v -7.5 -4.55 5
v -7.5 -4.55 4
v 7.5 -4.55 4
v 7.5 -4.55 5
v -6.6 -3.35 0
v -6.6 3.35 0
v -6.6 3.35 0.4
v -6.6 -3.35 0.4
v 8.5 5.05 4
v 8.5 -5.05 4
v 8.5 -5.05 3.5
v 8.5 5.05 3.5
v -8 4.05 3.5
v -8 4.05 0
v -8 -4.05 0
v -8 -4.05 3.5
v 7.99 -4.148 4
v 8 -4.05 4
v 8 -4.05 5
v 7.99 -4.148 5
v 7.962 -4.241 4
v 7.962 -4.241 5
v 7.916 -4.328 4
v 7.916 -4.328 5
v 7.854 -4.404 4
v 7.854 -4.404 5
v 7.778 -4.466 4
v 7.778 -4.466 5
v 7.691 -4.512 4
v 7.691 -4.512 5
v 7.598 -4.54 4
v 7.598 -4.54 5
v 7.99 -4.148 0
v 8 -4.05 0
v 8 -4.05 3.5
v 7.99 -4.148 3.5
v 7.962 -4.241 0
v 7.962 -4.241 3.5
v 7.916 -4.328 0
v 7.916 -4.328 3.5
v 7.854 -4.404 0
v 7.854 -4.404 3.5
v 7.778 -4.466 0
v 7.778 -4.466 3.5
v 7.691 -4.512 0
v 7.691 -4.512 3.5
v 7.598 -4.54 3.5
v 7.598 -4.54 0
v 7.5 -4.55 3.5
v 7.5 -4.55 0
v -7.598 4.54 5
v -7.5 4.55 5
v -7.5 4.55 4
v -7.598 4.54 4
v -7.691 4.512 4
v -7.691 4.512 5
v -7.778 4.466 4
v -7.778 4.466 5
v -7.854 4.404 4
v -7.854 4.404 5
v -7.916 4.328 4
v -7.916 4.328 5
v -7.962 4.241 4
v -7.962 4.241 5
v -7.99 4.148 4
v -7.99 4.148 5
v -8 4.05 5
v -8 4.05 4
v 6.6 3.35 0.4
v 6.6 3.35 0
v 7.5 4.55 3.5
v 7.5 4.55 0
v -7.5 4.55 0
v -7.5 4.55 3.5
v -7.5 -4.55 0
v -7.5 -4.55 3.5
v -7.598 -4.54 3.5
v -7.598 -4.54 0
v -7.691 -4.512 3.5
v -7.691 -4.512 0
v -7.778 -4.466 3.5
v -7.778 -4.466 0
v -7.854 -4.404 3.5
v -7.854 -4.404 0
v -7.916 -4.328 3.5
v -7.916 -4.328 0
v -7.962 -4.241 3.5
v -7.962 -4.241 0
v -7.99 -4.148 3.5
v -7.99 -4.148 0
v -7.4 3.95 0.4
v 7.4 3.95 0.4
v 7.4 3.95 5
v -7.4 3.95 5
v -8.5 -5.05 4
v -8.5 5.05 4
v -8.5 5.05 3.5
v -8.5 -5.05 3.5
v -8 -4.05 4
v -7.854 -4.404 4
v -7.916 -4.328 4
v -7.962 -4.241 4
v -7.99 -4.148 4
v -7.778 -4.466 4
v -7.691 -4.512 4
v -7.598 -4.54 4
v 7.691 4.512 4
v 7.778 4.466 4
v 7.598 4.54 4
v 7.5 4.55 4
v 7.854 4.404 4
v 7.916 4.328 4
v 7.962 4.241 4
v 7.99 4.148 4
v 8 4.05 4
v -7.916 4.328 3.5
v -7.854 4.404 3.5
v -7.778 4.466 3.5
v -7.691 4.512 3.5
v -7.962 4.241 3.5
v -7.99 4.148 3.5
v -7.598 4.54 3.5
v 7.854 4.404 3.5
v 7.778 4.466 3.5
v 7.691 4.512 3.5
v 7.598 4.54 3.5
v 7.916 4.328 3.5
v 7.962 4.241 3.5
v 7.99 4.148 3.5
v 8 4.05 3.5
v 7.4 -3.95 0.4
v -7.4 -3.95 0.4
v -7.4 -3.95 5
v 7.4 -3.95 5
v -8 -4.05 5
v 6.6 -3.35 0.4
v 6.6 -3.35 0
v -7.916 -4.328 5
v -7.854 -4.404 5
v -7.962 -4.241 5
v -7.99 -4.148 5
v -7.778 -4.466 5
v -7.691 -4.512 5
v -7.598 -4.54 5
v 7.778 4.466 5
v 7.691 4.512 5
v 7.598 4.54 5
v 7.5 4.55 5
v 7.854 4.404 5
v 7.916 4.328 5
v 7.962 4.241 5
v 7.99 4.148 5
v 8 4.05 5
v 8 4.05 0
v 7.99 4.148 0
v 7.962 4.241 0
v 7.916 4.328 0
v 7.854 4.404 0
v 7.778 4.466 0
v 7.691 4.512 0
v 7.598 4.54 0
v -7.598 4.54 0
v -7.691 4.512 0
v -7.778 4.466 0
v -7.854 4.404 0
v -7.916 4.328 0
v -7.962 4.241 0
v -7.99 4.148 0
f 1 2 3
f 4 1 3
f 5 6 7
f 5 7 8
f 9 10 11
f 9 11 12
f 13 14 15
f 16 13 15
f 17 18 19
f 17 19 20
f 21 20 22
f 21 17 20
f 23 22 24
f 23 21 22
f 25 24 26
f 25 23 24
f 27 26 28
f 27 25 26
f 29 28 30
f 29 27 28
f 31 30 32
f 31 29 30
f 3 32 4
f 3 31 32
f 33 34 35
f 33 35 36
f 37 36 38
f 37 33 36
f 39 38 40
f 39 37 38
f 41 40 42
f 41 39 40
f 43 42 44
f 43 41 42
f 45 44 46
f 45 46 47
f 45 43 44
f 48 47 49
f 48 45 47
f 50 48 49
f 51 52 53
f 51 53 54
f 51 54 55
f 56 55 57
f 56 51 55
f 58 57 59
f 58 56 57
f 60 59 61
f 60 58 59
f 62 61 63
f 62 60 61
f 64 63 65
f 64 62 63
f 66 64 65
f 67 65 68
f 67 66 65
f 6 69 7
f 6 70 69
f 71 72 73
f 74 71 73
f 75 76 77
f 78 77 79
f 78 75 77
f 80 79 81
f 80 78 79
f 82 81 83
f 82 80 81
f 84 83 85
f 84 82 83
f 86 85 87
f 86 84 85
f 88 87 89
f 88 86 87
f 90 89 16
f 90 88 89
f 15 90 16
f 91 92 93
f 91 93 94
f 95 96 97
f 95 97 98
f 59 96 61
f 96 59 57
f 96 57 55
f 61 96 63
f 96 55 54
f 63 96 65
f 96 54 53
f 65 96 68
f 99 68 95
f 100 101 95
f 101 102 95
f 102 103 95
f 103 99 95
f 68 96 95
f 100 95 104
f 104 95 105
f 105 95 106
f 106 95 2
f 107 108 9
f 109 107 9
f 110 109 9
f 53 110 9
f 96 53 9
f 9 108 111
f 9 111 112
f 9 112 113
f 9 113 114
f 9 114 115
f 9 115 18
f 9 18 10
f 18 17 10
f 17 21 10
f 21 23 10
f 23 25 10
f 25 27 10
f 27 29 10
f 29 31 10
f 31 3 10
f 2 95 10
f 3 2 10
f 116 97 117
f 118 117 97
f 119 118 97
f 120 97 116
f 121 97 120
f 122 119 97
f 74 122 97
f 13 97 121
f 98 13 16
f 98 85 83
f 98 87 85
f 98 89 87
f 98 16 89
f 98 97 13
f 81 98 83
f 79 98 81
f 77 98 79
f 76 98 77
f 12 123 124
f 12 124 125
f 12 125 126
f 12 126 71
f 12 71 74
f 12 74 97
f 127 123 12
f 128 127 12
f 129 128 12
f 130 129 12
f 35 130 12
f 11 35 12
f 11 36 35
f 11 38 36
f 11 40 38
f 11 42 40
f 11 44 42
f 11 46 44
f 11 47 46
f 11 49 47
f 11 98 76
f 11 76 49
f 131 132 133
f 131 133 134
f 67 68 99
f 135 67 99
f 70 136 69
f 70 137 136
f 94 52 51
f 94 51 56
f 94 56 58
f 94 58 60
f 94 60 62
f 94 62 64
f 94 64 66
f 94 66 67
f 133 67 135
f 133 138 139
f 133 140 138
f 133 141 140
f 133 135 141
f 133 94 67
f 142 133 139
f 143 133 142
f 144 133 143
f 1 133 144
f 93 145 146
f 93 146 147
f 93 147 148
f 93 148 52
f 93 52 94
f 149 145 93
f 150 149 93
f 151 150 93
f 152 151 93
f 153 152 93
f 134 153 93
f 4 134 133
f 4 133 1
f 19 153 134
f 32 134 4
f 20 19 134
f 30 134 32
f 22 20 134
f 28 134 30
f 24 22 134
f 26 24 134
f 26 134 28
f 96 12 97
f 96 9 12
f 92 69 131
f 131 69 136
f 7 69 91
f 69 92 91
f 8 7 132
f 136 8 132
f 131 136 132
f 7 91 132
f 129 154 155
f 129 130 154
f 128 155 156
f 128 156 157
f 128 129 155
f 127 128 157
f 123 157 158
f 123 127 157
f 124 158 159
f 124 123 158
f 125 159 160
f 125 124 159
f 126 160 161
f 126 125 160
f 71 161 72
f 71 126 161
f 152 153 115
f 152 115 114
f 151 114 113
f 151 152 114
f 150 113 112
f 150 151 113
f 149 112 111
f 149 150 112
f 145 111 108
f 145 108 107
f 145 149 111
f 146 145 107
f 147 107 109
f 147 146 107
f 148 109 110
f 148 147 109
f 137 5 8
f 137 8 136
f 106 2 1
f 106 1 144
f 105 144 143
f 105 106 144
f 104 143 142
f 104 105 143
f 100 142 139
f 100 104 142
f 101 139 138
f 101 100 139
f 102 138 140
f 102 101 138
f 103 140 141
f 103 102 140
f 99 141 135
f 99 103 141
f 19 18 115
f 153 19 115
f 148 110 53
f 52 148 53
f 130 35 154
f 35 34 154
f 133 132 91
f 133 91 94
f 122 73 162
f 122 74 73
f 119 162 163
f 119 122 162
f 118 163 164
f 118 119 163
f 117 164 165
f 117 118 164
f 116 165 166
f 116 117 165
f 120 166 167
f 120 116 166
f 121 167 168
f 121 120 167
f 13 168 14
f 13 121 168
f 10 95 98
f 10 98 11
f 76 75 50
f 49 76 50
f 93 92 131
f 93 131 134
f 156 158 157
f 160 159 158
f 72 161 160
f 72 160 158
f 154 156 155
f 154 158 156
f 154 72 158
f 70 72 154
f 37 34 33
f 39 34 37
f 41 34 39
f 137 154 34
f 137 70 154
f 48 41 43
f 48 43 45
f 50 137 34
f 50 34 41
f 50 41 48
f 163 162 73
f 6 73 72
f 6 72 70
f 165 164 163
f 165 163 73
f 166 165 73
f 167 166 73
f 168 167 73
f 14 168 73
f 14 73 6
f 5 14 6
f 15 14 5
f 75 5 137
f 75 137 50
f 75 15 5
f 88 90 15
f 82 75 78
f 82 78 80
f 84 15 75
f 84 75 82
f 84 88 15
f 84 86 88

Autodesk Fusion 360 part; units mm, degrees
sketch "Sketch1" plane through (0, 0, 0) normal (0, 0, 1) x (1, 0, 0)
  line L0 (8, 4.55) -> (-8, 4.55)
  line L1 (-8, 4.55) -> (-8, -4.55)
  line L2 (-8, -4.55) -> (8, -4.55)
  line L3 (8, -4.55) -> (8, 4.55)
  line L4 (8, 4.55) -> (-8, -4.55) construction
  line L5 (-8, 4.55) -> (8, -4.55) construction
  line L6 (7.2, 3.75) -> (-7.2, 3.75)
  line L7 (-7.2, 3.75) -> (-7.2, -3.75)
  line L8 (-7.2, -3.75) -> (7.2, -3.75)
  line L9 (7.2, -3.75) -> (7.2, 3.75)
  line L10 (7.2, 3.75) -> (-7.2, -3.75) construction
  line L11 (-7.2, 3.75) -> (7.2, -3.75) construction
  line L12 (6.7, 3.35) -> (-6.7, 3.35)
  line L13 (-6.7, 3.35) -> (-6.7, -3.35)
  line L14 (-6.7, -3.35) -> (6.7, -3.35)
  line L15 (6.7, -3.35) -> (6.7, 3.35)
  line L16 (6.7, 3.35) -> (-6.7, -3.35) construction
  line L17 (-6.7, 3.35) -> (6.7, -3.35) construction
  dimension "d1" = 16
  dimension "d2" = 9.1
  dimension "d3" = 14.4
  dimension "d4" = 7.5
  dimension "d5" = 13.4
  dimension "d6" = 6.7
extrude "Extrude1" add sketch "Sketch1" along normal blind 0.2 contours L0 L1 L2 L3 | L6 L7 L8 L9
extrude "Extrude2" add sketch "Sketch1" along normal blind 5 contours L0 L1 L2 L3
fillet "Fillet1" radius 0.5 4 edges at (8, -4.55, 2.5) (-8, -4.55, 2.5) (8, 4.55, 2.5) (-8, 4.55, 2.5)
extrude "Extrude3" cut 1 faces at (7.2, 1.25, 3.4) along direction (1, 0, 0) blind 0.4
extrude "Extrude4" cut 1 faces at (-2.2667, -3.75, 1.8) along direction (0, -1, 0) blind 0.4
extrude "Extrude5" cut 1 faces at (-7.2, 1.1167, 1.8) along direction (-1, 0, 0) blind 0.4
extrude "Extrude6" cut 1 faces at (2.5333, 3.75, 1.8) along direction (0, 1, 0) blind 0.4
extrude "Extrude7" add 1 faces at (2.5333, 4.15, 1.8) along direction (0, -1, 0) blind 0.2
extrude "Extrude8" add 1 faces at (2.5333, -4.15, 3.4) along direction (0, 1, 0) blind 0.2
extrude "Extrude9" add 1 faces at (-7.6, -1.3167, 1.8) along direction (1, 0, 0) blind 0.2
extrude "Extrude10" add 1 faces at (7.6, 1.3167, 1.8) along direction (-1, 0, 0) blind 0.2
extrude "Extrude11" add 1 faces at (-7.1667, 1.1167, 0.2) along direction (0, 0, 1) blind 0.2
extrude "Extrude12" add 1 faces at (6.7, 1.1167, 0.2667) along direction (-1, 0, 0) blind 0.1
extrude "Extrude13" add 1 faces at (-6.7, 1.1167, 0.1333) along direction (1, 0, 0) blind 0.1
ref_plane "WorkPlane1" through (0, 0, 4) normal (0, 0, -1) x (-1, 0, 0)
sketch "Sketch2" plane through (0, 0, 4) normal (0, 0, -1) x (1, 0, 0)
  line L0 (8.5, -5.05) -> (-8.5, -5.05)
  line L1 (-8.5, -5.05) -> (-8.5, 5.05)
  line L2 (-8.5, 5.05) -> (8.5, 5.05)
  line L3 (8.5, 5.05) -> (8.5, -5.05)
  line L4 (8.5, -5.05) -> (-8.5, 5.05) construction
  line L5 (-8.5, -5.05) -> (8.5, 5.05) construction
  line L6 (7.5059, -4.1931) -> (-7.5059, -4.1931)
  line L7 (-7.5059, -4.1931) -> (-7.5059, 4.1931)
  line L8 (-7.5059, 4.1931) -> (7.5059, 4.1931)
  line L9 (7.5059, 4.1931) -> (7.5059, -4.1931)
  line L10 (7.5059, -4.1931) -> (-7.5059, 4.1931) construction
  line L11 (-7.5059, -4.1931) -> (7.5059, 4.1931) construction
  dimension "d36" = 17
  dimension "d37" = 10.1
extrude "Extrude14" add sketch "Sketch2" along normal blind 0.5
